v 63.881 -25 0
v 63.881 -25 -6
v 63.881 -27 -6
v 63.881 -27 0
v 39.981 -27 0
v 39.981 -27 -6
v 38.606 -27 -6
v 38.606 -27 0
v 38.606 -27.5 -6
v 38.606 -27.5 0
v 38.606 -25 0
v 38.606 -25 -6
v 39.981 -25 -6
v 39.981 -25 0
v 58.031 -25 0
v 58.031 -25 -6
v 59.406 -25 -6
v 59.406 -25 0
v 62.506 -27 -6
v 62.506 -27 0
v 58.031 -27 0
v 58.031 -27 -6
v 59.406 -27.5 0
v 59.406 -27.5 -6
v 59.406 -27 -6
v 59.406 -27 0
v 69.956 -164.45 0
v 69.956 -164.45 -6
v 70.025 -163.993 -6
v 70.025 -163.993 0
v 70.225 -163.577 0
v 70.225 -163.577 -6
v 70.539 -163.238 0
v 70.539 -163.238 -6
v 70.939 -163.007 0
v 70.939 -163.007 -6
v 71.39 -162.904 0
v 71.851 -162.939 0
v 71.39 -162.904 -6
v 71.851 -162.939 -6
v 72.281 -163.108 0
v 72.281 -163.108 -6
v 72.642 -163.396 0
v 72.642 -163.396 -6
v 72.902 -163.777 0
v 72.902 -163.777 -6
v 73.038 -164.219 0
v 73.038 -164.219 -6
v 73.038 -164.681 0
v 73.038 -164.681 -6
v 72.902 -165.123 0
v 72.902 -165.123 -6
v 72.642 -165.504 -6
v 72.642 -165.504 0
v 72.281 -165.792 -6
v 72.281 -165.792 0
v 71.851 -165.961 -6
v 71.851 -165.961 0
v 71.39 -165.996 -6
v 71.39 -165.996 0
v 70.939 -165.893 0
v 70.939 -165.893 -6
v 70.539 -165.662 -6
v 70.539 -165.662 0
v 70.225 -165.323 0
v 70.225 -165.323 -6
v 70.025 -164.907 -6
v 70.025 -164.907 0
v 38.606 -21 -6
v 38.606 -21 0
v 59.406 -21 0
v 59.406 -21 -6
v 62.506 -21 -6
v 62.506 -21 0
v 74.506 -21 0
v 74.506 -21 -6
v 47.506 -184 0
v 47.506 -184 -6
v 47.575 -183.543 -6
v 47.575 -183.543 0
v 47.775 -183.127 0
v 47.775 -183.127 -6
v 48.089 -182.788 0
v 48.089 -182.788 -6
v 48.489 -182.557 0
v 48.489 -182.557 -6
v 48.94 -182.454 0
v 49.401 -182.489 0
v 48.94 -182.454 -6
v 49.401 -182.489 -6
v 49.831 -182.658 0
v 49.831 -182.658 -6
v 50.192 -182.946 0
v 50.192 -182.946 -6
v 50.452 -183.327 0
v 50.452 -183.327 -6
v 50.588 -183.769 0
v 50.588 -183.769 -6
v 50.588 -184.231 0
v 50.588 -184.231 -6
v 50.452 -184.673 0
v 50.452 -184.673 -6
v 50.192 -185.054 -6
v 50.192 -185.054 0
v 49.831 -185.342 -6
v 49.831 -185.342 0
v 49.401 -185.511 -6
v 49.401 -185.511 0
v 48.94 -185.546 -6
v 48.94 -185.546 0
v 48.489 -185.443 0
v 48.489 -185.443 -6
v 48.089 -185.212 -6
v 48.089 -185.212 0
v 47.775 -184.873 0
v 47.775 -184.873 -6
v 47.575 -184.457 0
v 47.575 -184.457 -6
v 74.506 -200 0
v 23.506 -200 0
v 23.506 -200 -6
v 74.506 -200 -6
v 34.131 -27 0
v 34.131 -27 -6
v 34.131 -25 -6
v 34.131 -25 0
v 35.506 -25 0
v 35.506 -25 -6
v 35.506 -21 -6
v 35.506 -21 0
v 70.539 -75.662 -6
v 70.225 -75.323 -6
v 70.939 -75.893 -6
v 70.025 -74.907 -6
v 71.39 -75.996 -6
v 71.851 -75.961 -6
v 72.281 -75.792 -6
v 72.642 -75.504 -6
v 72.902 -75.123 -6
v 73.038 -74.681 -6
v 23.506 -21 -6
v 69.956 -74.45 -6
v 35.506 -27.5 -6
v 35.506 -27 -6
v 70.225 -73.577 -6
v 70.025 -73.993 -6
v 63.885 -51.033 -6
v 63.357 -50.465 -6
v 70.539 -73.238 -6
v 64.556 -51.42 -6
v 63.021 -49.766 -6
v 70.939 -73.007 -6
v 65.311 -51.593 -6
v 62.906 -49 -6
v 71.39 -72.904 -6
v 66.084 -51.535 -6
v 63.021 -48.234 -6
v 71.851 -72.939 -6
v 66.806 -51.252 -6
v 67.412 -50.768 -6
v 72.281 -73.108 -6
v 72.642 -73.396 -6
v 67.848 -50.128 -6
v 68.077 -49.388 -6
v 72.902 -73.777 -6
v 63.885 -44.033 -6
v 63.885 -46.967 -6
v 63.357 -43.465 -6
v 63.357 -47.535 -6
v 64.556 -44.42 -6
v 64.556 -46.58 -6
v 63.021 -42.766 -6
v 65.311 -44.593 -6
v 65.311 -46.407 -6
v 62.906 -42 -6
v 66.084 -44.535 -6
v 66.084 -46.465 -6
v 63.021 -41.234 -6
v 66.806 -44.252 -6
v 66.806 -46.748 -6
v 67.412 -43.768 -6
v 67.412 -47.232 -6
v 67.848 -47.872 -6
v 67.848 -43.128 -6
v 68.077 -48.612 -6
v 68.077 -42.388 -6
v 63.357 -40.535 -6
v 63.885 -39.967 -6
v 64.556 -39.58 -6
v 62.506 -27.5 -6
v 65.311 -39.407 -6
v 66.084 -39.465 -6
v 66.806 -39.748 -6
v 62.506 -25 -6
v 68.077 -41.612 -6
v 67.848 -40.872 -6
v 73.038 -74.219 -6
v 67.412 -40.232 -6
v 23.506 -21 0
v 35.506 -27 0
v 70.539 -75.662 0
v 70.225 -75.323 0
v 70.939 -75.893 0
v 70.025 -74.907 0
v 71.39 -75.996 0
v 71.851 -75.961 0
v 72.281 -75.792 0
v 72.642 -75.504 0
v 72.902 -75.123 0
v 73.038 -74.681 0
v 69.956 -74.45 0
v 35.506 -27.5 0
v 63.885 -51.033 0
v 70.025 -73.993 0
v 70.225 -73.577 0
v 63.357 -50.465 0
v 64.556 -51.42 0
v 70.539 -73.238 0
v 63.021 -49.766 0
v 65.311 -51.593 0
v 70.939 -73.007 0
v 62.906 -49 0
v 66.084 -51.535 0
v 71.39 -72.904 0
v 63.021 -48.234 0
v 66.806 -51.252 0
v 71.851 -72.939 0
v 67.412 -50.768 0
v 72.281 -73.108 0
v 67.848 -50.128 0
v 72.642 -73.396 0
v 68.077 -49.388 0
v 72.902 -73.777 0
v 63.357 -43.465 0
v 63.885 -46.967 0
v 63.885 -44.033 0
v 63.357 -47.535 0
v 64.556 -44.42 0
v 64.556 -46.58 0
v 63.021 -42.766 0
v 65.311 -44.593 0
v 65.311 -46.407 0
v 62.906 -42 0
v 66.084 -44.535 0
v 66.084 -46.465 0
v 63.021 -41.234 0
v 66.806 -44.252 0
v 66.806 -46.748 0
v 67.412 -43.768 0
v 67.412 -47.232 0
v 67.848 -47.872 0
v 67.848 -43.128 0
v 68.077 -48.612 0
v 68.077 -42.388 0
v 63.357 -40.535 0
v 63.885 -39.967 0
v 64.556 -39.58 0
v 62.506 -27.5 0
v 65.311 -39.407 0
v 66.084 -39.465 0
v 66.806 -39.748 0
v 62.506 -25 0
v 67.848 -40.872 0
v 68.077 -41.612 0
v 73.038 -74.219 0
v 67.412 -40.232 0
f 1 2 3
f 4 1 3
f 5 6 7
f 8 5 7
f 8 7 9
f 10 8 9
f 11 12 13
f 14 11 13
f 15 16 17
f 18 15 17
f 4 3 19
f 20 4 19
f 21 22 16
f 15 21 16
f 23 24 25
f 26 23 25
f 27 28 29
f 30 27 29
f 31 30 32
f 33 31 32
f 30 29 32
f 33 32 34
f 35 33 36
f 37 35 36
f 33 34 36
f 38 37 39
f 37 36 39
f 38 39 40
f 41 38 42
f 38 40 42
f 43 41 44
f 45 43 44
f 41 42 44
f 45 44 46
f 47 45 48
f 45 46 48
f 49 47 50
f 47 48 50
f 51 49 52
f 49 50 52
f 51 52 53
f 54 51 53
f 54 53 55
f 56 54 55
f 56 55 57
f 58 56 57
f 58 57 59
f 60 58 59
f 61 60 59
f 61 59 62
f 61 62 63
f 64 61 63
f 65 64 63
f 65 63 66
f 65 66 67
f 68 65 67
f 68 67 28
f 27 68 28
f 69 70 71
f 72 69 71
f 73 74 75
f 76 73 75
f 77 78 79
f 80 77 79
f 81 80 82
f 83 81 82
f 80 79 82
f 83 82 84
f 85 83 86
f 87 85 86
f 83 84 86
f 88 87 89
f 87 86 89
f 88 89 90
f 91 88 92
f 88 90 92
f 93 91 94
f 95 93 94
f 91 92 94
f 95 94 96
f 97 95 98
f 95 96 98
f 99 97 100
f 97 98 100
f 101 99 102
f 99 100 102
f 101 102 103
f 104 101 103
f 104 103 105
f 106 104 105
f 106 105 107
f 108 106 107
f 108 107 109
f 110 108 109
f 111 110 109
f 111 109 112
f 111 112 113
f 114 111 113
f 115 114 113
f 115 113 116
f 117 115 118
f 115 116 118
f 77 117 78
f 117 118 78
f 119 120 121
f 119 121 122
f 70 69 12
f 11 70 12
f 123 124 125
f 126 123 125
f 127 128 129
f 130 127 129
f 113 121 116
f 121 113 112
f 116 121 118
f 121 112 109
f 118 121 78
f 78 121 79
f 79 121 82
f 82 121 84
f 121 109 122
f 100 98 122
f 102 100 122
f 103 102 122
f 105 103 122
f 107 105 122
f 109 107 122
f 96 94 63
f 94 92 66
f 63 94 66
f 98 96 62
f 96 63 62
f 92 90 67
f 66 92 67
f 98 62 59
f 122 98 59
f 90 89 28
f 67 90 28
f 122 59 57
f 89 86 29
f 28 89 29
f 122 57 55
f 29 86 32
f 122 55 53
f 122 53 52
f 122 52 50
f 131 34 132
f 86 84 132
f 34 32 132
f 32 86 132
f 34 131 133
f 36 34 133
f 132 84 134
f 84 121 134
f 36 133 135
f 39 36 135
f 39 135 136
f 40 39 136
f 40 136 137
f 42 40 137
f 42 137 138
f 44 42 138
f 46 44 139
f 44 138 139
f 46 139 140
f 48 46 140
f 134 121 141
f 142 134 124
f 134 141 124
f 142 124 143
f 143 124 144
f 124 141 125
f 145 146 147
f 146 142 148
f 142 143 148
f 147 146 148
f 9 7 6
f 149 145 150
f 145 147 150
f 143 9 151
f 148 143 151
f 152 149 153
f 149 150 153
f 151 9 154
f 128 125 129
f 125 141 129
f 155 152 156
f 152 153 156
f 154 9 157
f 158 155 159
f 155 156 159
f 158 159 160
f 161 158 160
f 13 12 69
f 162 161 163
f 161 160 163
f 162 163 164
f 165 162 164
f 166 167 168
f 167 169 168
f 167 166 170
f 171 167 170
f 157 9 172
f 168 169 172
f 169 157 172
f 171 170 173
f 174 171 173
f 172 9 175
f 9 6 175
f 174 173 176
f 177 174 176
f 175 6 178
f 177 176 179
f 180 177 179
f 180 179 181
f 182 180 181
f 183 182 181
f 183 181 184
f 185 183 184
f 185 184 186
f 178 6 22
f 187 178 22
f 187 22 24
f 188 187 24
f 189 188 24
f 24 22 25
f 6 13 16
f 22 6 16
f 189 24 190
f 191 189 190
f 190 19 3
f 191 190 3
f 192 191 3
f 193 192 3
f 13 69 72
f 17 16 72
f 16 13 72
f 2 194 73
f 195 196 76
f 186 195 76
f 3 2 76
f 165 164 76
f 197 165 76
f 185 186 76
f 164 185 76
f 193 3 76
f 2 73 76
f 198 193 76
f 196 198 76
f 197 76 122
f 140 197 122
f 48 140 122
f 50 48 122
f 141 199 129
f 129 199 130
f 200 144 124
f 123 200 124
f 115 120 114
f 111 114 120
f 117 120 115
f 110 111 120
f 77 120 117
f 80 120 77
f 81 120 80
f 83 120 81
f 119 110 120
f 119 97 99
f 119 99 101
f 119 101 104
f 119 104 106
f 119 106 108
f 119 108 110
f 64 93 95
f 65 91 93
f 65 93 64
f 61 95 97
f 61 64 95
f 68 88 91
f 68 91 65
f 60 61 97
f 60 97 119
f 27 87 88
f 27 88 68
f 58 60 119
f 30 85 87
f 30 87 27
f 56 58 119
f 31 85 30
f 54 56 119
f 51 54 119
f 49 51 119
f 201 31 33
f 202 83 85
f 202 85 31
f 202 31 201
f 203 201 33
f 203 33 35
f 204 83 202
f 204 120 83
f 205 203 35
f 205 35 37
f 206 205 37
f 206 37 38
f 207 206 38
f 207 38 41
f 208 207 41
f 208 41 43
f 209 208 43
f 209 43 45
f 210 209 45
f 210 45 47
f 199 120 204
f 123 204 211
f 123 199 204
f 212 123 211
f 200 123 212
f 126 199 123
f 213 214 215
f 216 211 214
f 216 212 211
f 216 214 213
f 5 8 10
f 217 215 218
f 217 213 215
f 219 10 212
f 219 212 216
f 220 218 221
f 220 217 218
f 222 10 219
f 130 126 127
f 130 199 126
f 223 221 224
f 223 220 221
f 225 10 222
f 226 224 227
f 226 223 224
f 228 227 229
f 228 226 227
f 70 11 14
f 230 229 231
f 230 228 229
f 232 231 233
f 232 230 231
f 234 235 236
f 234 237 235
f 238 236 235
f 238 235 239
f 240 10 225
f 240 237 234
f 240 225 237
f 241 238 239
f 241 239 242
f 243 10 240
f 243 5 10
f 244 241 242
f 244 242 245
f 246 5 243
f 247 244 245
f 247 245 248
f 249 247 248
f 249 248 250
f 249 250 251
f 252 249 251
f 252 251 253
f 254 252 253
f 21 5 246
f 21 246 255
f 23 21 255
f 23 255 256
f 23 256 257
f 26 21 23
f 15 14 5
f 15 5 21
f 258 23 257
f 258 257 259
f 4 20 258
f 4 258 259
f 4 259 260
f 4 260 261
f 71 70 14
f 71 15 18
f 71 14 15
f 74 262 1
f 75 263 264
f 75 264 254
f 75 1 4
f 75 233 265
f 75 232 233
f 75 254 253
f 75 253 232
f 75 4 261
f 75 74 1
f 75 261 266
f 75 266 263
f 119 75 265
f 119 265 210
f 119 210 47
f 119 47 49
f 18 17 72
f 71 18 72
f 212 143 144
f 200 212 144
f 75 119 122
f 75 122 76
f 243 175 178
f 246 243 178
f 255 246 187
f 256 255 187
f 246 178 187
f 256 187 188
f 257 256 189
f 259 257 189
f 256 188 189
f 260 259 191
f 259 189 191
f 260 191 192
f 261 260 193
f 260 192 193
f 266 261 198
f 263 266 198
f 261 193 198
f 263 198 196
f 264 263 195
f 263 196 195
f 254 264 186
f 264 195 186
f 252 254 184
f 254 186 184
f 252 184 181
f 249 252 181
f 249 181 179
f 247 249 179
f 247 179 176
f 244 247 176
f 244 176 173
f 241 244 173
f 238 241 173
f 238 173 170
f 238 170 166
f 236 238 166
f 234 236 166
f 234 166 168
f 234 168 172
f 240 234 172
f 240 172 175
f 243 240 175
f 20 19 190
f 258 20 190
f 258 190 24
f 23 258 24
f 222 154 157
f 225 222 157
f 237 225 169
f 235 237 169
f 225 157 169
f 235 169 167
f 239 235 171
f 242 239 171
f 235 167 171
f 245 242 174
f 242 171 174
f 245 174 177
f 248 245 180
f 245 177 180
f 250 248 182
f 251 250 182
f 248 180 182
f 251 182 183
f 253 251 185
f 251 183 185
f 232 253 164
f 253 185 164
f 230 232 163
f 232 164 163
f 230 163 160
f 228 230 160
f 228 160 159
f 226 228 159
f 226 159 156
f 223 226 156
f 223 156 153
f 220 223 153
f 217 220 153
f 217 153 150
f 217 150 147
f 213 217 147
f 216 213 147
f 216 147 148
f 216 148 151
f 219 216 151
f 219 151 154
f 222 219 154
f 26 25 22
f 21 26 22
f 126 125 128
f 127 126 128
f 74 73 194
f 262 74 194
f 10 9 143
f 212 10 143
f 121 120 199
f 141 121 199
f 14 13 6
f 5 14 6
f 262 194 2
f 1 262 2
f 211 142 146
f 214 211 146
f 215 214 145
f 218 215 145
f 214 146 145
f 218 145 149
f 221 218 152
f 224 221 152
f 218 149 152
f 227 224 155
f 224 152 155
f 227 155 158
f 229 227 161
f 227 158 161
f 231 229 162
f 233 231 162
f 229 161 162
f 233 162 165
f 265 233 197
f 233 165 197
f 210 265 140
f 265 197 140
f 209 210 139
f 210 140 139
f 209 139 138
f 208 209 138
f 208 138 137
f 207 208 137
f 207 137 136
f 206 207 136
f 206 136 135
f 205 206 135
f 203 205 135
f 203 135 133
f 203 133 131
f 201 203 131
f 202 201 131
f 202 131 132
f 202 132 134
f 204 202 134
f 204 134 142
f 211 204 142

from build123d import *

# Parameters (mm, degrees)
SZKIC1_W                    = 51
SZKIC1_H                    = 179
DODANIE_WYCI_GNI_CIE1_DEPTH = 6
SZKIC3_R                    = 1.55
WYTNIJ_WYCI_GNI_CIE1_DEPTH  = 214.511356279
WYTNIJ_WYCI_GNI_CIE2_DEPTH  = 214.511356279
SZYK_LINIOWY1_COUNT         = 2
SZYK_LINIOWY1_PITCH         = 23.9
SZKIC5_R                    = 2.6
WYTNIJ_WYCI_GNI_CIE3_DEPTH  = 214.511356279
SZKIC7_R                    = 1.55
WYTNIJ_WYCI_GNI_CIE4_DEPTH  = 6


with BuildPart() as part:
    # Szkic1 → Dodanie-wyciągnięcie1 (new body)
    with BuildSketch(Plane.XY):
        with Locations((49.005699514, -110.5)):
            Rectangle(SZKIC1_W, SZKIC1_H)
    extrude(amount=-DODANIE_WYCI_GNI_CIE1_DEPTH)

    # Szkic3 → Wytnij-wyciągnięcie1 (cut, through all)
    with BuildSketch(Plane(origin=(0, 0, -6), x_dir=(-1, 0, 0), z_dir=(0, 0, -1))):
        with Locations((-71.505699514, -164.45)):
            Circle(SZKIC3_R)
        with Locations((-71.505699514, -74.45)):
            Circle(SZKIC3_R)
    extrude(amount=-WYTNIJ_WYCI_GNI_CIE1_DEPTH, mode=Mode.SUBTRACT)

    # Szkic4 → Wytnij-wyciągnięcie2 (cut, through all)
    with BuildSketch(Plane(origin=(0, 0, -6), x_dir=(-1, 0, 0), z_dir=(0, 0, -1))):
        Polygon((-59.405699514, -21), (-62.505699514, -21), (-62.505699514, -25), (-63.880699514, -25), (-63.880699514, -27), (-62.505699514, -27), (-62.505699514, -27.5), (-59.405699514, -27.5), (-59.405699514, -27), (-58.030699514, -27), (-58.030699514, -25), (-59.405699514, -25), align=None)
    wytnij_wyci_gni_cie2 = extrude(amount=-WYTNIJ_WYCI_GNI_CIE2_DEPTH, mode=Mode.SUBTRACT)

    # Szyk liniowy1: Wytnij-wyciągnięcie2 ×2
    with Locations(*[(-i * SZYK_LINIOWY1_PITCH, 0, 0) for i in range(1, SZYK_LINIOWY1_COUNT)]):
        add(wytnij_wyci_gni_cie2, mode=Mode.SUBTRACT)

    # Szkic5 → Wytnij-wyciągnięcie3 (cut, through all)
    with BuildSketch(Plane(origin=(0, 0, -6), x_dir=(-1, 0, 0), z_dir=(0, 0, -1))):
        with Locations((-65.505699514, -42)):
            Circle(SZKIC5_R)
        with Locations((-65.505699514, -49)):
            Circle(SZKIC5_R)
    extrude(amount=-WYTNIJ_WYCI_GNI_CIE3_DEPTH, mode=Mode.SUBTRACT)

    # Szkic7 → Wytnij-wyciągnięcie4 (cut)
    with BuildSketch(Plane(origin=(0, 0, -6), x_dir=(-1, 0, 0), z_dir=(0, 0, -1))):
        with Locations((-49.055699514, -184)):
            Circle(SZKIC7_R)
    extrude(amount=-WYTNIJ_WYCI_GNI_CIE4_DEPTH, mode=Mode.SUBTRACT)


solid = part.part
